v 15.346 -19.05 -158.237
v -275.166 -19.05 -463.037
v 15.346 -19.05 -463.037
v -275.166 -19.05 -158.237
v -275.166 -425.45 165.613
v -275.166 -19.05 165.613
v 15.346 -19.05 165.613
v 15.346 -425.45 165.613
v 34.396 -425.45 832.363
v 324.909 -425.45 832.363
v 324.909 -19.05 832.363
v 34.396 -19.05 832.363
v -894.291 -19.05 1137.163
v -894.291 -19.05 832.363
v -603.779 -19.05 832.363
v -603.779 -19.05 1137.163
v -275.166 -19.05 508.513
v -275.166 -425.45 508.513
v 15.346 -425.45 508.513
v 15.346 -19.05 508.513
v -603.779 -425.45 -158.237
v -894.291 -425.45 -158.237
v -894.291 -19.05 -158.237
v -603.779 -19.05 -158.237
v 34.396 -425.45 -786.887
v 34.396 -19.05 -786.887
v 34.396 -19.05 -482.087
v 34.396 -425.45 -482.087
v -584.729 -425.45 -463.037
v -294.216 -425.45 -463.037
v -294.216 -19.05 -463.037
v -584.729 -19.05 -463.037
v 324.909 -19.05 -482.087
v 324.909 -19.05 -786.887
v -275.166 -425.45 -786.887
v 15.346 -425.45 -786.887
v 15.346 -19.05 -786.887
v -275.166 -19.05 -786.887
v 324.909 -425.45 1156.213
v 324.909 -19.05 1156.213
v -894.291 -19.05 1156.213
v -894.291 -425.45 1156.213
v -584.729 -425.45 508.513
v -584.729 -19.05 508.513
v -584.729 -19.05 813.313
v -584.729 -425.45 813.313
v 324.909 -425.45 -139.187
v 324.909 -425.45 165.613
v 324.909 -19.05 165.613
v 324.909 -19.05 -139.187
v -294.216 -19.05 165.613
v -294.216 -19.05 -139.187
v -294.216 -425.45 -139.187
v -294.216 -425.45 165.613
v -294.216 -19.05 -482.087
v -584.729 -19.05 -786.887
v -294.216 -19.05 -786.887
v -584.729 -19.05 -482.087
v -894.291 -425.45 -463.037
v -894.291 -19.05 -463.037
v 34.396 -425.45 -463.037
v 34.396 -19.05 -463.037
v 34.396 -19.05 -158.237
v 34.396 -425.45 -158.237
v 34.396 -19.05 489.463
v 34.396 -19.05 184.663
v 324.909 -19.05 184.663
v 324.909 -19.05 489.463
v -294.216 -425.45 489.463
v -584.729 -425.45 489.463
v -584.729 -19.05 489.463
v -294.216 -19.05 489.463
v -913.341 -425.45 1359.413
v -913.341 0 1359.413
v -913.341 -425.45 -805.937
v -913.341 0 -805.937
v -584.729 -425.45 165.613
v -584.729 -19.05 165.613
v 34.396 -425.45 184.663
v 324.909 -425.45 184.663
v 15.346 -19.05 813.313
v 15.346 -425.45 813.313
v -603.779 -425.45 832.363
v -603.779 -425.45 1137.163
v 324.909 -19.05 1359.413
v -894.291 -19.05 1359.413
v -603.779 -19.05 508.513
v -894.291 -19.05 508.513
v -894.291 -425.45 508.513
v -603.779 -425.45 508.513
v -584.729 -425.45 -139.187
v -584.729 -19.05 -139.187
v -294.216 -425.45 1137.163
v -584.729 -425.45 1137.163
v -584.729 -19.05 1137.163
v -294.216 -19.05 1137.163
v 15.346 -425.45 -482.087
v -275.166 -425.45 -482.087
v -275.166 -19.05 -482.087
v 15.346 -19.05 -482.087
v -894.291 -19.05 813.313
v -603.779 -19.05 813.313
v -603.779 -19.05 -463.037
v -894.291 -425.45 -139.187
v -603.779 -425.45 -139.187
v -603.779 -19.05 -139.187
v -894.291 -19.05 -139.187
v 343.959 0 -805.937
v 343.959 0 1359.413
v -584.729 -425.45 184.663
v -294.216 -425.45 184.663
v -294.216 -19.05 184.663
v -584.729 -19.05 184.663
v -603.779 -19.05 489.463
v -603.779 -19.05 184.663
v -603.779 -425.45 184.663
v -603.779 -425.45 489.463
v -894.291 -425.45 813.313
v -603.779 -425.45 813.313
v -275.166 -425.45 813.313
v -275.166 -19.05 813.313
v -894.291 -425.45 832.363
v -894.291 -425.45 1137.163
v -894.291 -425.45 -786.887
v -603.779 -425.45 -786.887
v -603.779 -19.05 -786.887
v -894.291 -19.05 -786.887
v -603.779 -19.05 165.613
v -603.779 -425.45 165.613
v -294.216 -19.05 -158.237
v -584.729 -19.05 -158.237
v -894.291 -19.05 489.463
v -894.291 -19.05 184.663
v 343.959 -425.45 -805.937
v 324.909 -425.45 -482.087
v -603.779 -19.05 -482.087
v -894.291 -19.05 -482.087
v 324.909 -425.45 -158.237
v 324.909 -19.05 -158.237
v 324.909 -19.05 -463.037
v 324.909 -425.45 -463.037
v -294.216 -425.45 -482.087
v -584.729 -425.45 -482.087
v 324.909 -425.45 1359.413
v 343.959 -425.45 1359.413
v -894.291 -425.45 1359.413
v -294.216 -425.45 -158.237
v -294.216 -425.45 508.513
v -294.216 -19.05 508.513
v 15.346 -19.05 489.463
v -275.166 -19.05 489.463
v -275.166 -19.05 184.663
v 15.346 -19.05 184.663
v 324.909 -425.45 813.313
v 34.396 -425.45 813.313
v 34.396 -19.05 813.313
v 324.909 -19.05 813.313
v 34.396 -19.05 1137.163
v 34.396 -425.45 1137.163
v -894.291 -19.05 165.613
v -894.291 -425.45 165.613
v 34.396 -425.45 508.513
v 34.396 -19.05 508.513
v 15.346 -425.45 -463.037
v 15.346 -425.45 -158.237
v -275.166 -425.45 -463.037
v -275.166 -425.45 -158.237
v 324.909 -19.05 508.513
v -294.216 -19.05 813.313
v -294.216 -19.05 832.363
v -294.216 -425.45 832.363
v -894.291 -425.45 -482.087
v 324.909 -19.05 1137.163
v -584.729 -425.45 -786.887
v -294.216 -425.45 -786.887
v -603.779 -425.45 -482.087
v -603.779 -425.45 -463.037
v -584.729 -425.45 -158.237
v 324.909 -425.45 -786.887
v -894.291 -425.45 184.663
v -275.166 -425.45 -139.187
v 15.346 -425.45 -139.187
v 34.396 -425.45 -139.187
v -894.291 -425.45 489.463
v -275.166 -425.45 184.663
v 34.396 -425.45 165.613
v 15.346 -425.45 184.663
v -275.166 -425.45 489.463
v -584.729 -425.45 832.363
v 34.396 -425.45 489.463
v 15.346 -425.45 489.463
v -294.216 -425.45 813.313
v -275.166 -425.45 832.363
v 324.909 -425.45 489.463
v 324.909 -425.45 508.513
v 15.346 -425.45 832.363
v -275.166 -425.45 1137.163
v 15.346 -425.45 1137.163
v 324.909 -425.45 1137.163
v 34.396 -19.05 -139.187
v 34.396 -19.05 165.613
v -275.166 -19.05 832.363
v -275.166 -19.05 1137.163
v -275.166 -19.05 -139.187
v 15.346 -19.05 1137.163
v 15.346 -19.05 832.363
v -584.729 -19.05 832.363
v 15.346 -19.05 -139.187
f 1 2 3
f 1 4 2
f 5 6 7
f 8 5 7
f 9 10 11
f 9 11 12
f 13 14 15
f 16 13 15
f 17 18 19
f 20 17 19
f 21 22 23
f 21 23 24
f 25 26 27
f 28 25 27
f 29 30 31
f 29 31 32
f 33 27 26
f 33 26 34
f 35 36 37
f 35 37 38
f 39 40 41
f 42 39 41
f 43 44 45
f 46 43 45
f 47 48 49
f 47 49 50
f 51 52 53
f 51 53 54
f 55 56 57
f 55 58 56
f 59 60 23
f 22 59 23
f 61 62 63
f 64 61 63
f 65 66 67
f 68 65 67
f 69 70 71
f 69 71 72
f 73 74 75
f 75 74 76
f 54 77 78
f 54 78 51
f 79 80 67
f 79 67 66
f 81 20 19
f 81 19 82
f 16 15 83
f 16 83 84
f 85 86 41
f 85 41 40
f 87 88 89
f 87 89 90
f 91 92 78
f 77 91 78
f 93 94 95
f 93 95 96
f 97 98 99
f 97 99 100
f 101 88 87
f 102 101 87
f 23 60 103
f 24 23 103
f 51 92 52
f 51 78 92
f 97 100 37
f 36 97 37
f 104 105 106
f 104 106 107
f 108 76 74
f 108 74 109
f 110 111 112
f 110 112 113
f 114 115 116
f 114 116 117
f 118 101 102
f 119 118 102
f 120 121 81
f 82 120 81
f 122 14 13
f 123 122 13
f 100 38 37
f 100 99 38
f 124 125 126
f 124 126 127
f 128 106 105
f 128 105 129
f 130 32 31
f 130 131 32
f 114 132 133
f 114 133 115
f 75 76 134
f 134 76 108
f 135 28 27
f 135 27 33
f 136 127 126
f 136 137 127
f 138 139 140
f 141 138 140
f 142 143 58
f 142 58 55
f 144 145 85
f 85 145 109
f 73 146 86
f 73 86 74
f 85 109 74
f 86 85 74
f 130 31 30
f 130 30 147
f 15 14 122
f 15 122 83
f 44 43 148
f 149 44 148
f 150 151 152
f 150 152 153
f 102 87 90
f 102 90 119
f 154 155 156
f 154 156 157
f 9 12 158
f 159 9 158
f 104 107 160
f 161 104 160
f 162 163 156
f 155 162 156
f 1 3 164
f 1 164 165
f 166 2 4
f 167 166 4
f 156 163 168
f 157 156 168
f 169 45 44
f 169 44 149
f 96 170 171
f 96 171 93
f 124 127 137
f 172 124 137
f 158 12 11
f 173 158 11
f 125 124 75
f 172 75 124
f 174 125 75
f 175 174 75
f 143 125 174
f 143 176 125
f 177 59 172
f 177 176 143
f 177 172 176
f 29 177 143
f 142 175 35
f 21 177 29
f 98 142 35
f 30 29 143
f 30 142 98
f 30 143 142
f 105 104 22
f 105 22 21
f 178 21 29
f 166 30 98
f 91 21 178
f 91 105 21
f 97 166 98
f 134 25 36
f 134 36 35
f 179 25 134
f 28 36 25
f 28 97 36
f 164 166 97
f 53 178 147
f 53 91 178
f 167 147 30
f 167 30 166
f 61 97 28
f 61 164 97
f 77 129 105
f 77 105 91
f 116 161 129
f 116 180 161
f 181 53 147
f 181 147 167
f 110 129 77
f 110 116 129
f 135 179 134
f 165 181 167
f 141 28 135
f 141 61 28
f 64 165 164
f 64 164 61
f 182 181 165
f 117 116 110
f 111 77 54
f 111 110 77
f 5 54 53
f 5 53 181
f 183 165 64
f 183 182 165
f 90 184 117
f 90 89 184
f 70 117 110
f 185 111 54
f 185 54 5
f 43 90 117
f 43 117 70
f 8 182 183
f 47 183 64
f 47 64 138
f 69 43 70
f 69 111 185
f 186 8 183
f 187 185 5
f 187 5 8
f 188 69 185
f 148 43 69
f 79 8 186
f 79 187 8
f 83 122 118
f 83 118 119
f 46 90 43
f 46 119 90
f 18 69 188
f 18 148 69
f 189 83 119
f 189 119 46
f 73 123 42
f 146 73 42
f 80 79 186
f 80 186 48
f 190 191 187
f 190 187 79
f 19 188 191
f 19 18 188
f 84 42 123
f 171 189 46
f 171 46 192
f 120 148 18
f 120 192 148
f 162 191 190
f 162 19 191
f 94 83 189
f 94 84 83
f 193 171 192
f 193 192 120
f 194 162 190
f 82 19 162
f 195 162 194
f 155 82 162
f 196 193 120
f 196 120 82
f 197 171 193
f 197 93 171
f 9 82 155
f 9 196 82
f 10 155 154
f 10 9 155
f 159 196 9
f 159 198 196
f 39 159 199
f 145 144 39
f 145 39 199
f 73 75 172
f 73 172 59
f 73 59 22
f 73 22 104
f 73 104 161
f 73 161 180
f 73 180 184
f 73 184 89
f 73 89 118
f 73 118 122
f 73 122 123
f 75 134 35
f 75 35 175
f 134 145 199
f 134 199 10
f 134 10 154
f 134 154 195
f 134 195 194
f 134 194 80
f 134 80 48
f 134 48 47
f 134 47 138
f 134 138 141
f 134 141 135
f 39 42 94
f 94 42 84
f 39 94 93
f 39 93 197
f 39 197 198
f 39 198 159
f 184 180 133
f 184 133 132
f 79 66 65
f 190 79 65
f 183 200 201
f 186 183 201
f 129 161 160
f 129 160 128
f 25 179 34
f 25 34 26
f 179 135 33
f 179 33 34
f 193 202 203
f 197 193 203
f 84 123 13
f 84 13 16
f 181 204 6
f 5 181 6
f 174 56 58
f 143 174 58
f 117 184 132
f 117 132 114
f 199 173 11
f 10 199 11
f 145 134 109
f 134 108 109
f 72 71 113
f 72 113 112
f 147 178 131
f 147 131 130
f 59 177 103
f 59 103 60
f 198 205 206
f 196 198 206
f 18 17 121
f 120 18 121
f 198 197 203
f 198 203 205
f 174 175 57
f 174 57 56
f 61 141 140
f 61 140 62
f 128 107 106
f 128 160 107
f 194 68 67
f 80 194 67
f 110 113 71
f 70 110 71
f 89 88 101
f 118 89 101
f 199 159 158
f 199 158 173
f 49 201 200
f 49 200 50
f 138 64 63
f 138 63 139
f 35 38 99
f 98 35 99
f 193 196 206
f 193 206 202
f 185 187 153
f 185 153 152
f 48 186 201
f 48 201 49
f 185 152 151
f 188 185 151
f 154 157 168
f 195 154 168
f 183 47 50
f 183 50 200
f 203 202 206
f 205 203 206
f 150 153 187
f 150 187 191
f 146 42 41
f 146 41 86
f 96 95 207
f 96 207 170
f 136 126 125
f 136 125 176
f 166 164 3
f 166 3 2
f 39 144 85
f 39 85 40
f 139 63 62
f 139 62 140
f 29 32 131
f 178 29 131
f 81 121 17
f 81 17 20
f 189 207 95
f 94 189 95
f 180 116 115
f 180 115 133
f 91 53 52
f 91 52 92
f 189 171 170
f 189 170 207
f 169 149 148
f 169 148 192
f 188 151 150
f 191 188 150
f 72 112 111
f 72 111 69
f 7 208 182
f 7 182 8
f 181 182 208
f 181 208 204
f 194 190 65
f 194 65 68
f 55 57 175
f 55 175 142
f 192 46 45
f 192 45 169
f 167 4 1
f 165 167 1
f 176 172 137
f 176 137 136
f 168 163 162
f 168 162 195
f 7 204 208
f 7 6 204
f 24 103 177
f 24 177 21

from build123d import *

# Parameters (mm, degrees)
F0_W     = 1257.3
F0_H     = 2165.35
F1_DEPTH = 19.05
F2_W     = 19.05
F2_H     = 304.8
F2_W_2   = 290.5125
F2_H_2   = 19.05
F3_DEPTH = 406.4


with BuildPart() as f1:
    # F0 (on Front) → F1 (new body)
    with BuildSketch(Plane.XZ):
        with Locations((-284.6911793649, 276.7382148782)):
            Rectangle(F0_W, F0_H)
    extrude(amount=F1_DEPTH)

    # F2 (on face) → F3 (join)
    with BuildSketch(Plane.XZ.offset(19.05)):
        Polygon((-913.3411793649, 1359.4132148782), (-913.3411793649, -805.9367851218), (-894.2911793649, -805.9367851218), (-894.2911793649, -786.8867851218), (-894.2911793649, -482.0867851218), (-894.2911793649, -463.0367851218), (-894.2911793649, -158.2367851218), (-894.2911793649, -139.1867851218), (-894.2911793649, 165.6132148782), (-894.2911793649, 184.6632148782), (-894.2911793649, 489.4632148782), (-894.2911793649, 508.5132148782), (-894.2911793649, 813.3132148782), (-894.2911793649, 832.3632148782), (-894.2911793649, 1137.1632148782), (-894.2911793649, 1156.2132148782), (-894.2911793649, 1359.4132148782), align=None)
        Polygon((-894.2911793649, -786.8867851218), (-894.2911793649, -805.9367851218), (324.9088206351, -805.9367851218), (324.9088206351, -786.8867851218), (34.3963206351, -786.8867851218), (19.05, -786.8867851218), (15.3463206351, -786.8867851218), (0, -786.8867851218), (-275.1661793649, -786.8867851218), (-294.2161793649, -786.8867851218), (-584.7286793649, -786.8867851218), (-603.7786793649, -786.8867851218), align=None)
        Polygon((324.9088206351, -786.8867851218), (324.9088206351, -805.9367851218), (343.9588206351, -805.9367851218), (343.9588206351, 1359.4132148782), (324.9088206351, 1359.4132148782), (324.9088206351, 1156.2132148782), (324.9088206351, 1137.1632148782), (324.9088206351, 832.3632148782), (324.9088206351, 813.3132148782), (324.9088206351, 508.5132148782), (324.9088206351, 489.4632148782), (324.9088206351, 184.6632148782), (324.9088206351, 165.6132148782), (324.9088206351, -139.1867851218), (324.9088206351, -158.2367851218), (324.9088206351, -463.0367851218), (324.9088206351, -482.0867851218), align=None)
        Polygon((324.9088206351, 1156.2132148782), (-894.2911793649, 1156.2132148782), (-894.2911793649, 1137.1632148782), (-603.7786793649, 1137.1632148782), (-584.7286793649, 1137.1632148782), (-294.2161793649, 1137.1632148782), (-275.1661793649, 1137.1632148782), (0, 1137.1632148782), (15.3463206351, 1137.1632148782), (19.05, 1137.1632148782), (34.3963206351, 1137.1632148782), (324.9088206351, 1137.1632148782), align=None)
        with Locations((-594.2536793649, 660.9132148782)):
            Rectangle(F2_W, F2_H)
        with Locations((-594.2536793649, 984.7632148782)):
            Rectangle(F2_W, F2_H)
        with Locations((-749.0349293649, 822.8382148782)):
            Rectangle(F2_W_2, F2_H_2)
        with Locations((-439.4724293649, 822.8382148782)):
            Rectangle(F2_W_2, F2_H_2)
        with Locations((-594.2536793649, 822.8382148782)):
            Rectangle(F2_W, F2_H_2)
        with Locations((-284.6911793649, 822.8382148782)):
            Rectangle(F2_W, F2_H_2)
        with Locations((-129.9099293649, 822.8382148782)):
            Rectangle(F2_W_2, F2_H_2)
        with Locations((24.8713206351, 822.8382148782)):
            Rectangle(F2_W, F2_H_2)
        with Locations((179.6525706351, 822.8382148782)):
            Rectangle(F2_W_2, F2_H_2)
        Polygon((34.3963206351, 832.3632148782), (34.3963206351, 1137.1632148782), (19.05, 1137.1632148782), (15.3463206351, 1137.1632148782), (15.3463206351, 832.3632148782), align=None)
        with Locations((-284.6911793649, 984.7632148782)):
            Rectangle(F2_W, F2_H)
        with Locations((-284.6911793649, 660.9132148782)):
            Rectangle(F2_W, F2_H)
        with Locations((24.8713206351, 660.9132148782)):
            Rectangle(F2_W, F2_H)
        with Locations((-749.0349293649, 498.9882148782)):
            Rectangle(F2_W_2, F2_H_2)
        with Locations((-594.2536793649, 498.9882148782)):
            Rectangle(F2_W, F2_H_2)
        with Locations((-439.4724293649, 498.9882148782)):
            Rectangle(F2_W_2, F2_H_2)
        with Locations((-284.6911793649, 498.9882148782)):
            Rectangle(F2_W, F2_H_2)
        with Locations((-129.9099293649, 498.9882148782)):
            Rectangle(F2_W_2, F2_H_2)
        with Locations((24.8713206351, 498.9882148782)):
            Rectangle(F2_W, F2_H_2)
        with Locations((179.6525706351, 498.9882148782)):
            Rectangle(F2_W_2, F2_H_2)
        with Locations((-749.0349293649, 175.1382148782)):
            Rectangle(F2_W_2, F2_H_2)
        with Locations((-594.2536793649, 175.1382148782)):
            Rectangle(F2_W, F2_H_2)
        with Locations((-439.4724293649, 175.1382148782)):
            Rectangle(F2_W_2, F2_H_2)
        with Locations((-284.6911793649, 175.1382148782)):
            Rectangle(F2_W, F2_H_2)
        with Locations((-129.9099293649, 175.1382148782)):
            Rectangle(F2_W_2, F2_H_2)
        with Locations((24.8713206351, 175.1382148782)):
            Rectangle(F2_W, F2_H_2)
        with Locations((179.6525706351, 175.1382148782)):
            Rectangle(F2_W_2, F2_H_2)
        with Locations((24.8713206351, 337.0632148782)):
            Rectangle(F2_W, F2_H)
        with Locations((-284.6911793649, 337.0632148782)):
            Rectangle(F2_W, F2_H)
        with Locations((-594.2536793649, 337.0632148782)):
            Rectangle(F2_W, F2_H)
        with Locations((-749.0349293649, -148.7117851218)):
            Rectangle(F2_W_2, F2_H_2)
        with Locations((-594.2536793649, -148.7117851218)):
            Rectangle(F2_W, F2_H_2)
        with Locations((-439.4724293649, -148.7117851218)):
            Rectangle(F2_W_2, F2_H_2)
        with Locations((-284.6911793649, -148.7117851218)):
            Rectangle(F2_W, F2_H_2)
        with Locations((-129.9099293649, -148.7117851218)):
            Rectangle(F2_W_2, F2_H_2)
        with Locations((24.8713206351, -148.7117851218)):
            Rectangle(F2_W, F2_H_2)
        with Locations((179.6525706351, -148.7117851218)):
            Rectangle(F2_W_2, F2_H_2)
        with Locations((-594.2536793649, 13.2132148782)):
            Rectangle(F2_W, F2_H)
        with Locations((-284.6911793649, 13.2132148782)):
            Rectangle(F2_W, F2_H)
        with Locations((24.8713206351, 13.2132148782)):
            Rectangle(F2_W, F2_H)
        with Locations((-749.0349293649, -472.5617851218)):
            Rectangle(F2_W_2, F2_H_2)
        with Locations((-594.2536793649, -472.5617851218)):
            Rectangle(F2_W, F2_H_2)
        with Locations((-439.4724293649, -472.5617851218)):
            Rectangle(F2_W_2, F2_H_2)
        with Locations((-284.6911793649, -472.5617851218)):
            Rectangle(F2_W, F2_H_2)
        with Locations((-129.9099293649, -472.5617851218)):
            Rectangle(F2_W_2, F2_H_2)
        with Locations((24.8713206351, -472.5617851218)):
            Rectangle(F2_W, F2_H_2)
        with Locations((179.6525706351, -472.5617851218)):
            Rectangle(F2_W_2, F2_H_2)
        with Locations((-594.2536793649, -310.6367851218)):
            Rectangle(F2_W, F2_H)
        with Locations((-284.6911793649, -310.6367851218)):
            Rectangle(F2_W, F2_H)
        with Locations((24.8713206351, -310.6367851218)):
            Rectangle(F2_W, F2_H)
        Polygon((19.05, -786.8867851218), (34.3963206351, -786.8867851218), (34.3963206351, -482.0867851218), (15.3463206351, -482.0867851218), (15.3463206351, -786.8867851218), align=None)
        with Locations((-284.6911793649, -634.4867851218)):
            Rectangle(F2_W, F2_H)
        with Locations((-594.2536793649, -634.4867851218)):
            Rectangle(F2_W, F2_H)
    extrude(amount=F3_DEPTH)


solid = f1.part
